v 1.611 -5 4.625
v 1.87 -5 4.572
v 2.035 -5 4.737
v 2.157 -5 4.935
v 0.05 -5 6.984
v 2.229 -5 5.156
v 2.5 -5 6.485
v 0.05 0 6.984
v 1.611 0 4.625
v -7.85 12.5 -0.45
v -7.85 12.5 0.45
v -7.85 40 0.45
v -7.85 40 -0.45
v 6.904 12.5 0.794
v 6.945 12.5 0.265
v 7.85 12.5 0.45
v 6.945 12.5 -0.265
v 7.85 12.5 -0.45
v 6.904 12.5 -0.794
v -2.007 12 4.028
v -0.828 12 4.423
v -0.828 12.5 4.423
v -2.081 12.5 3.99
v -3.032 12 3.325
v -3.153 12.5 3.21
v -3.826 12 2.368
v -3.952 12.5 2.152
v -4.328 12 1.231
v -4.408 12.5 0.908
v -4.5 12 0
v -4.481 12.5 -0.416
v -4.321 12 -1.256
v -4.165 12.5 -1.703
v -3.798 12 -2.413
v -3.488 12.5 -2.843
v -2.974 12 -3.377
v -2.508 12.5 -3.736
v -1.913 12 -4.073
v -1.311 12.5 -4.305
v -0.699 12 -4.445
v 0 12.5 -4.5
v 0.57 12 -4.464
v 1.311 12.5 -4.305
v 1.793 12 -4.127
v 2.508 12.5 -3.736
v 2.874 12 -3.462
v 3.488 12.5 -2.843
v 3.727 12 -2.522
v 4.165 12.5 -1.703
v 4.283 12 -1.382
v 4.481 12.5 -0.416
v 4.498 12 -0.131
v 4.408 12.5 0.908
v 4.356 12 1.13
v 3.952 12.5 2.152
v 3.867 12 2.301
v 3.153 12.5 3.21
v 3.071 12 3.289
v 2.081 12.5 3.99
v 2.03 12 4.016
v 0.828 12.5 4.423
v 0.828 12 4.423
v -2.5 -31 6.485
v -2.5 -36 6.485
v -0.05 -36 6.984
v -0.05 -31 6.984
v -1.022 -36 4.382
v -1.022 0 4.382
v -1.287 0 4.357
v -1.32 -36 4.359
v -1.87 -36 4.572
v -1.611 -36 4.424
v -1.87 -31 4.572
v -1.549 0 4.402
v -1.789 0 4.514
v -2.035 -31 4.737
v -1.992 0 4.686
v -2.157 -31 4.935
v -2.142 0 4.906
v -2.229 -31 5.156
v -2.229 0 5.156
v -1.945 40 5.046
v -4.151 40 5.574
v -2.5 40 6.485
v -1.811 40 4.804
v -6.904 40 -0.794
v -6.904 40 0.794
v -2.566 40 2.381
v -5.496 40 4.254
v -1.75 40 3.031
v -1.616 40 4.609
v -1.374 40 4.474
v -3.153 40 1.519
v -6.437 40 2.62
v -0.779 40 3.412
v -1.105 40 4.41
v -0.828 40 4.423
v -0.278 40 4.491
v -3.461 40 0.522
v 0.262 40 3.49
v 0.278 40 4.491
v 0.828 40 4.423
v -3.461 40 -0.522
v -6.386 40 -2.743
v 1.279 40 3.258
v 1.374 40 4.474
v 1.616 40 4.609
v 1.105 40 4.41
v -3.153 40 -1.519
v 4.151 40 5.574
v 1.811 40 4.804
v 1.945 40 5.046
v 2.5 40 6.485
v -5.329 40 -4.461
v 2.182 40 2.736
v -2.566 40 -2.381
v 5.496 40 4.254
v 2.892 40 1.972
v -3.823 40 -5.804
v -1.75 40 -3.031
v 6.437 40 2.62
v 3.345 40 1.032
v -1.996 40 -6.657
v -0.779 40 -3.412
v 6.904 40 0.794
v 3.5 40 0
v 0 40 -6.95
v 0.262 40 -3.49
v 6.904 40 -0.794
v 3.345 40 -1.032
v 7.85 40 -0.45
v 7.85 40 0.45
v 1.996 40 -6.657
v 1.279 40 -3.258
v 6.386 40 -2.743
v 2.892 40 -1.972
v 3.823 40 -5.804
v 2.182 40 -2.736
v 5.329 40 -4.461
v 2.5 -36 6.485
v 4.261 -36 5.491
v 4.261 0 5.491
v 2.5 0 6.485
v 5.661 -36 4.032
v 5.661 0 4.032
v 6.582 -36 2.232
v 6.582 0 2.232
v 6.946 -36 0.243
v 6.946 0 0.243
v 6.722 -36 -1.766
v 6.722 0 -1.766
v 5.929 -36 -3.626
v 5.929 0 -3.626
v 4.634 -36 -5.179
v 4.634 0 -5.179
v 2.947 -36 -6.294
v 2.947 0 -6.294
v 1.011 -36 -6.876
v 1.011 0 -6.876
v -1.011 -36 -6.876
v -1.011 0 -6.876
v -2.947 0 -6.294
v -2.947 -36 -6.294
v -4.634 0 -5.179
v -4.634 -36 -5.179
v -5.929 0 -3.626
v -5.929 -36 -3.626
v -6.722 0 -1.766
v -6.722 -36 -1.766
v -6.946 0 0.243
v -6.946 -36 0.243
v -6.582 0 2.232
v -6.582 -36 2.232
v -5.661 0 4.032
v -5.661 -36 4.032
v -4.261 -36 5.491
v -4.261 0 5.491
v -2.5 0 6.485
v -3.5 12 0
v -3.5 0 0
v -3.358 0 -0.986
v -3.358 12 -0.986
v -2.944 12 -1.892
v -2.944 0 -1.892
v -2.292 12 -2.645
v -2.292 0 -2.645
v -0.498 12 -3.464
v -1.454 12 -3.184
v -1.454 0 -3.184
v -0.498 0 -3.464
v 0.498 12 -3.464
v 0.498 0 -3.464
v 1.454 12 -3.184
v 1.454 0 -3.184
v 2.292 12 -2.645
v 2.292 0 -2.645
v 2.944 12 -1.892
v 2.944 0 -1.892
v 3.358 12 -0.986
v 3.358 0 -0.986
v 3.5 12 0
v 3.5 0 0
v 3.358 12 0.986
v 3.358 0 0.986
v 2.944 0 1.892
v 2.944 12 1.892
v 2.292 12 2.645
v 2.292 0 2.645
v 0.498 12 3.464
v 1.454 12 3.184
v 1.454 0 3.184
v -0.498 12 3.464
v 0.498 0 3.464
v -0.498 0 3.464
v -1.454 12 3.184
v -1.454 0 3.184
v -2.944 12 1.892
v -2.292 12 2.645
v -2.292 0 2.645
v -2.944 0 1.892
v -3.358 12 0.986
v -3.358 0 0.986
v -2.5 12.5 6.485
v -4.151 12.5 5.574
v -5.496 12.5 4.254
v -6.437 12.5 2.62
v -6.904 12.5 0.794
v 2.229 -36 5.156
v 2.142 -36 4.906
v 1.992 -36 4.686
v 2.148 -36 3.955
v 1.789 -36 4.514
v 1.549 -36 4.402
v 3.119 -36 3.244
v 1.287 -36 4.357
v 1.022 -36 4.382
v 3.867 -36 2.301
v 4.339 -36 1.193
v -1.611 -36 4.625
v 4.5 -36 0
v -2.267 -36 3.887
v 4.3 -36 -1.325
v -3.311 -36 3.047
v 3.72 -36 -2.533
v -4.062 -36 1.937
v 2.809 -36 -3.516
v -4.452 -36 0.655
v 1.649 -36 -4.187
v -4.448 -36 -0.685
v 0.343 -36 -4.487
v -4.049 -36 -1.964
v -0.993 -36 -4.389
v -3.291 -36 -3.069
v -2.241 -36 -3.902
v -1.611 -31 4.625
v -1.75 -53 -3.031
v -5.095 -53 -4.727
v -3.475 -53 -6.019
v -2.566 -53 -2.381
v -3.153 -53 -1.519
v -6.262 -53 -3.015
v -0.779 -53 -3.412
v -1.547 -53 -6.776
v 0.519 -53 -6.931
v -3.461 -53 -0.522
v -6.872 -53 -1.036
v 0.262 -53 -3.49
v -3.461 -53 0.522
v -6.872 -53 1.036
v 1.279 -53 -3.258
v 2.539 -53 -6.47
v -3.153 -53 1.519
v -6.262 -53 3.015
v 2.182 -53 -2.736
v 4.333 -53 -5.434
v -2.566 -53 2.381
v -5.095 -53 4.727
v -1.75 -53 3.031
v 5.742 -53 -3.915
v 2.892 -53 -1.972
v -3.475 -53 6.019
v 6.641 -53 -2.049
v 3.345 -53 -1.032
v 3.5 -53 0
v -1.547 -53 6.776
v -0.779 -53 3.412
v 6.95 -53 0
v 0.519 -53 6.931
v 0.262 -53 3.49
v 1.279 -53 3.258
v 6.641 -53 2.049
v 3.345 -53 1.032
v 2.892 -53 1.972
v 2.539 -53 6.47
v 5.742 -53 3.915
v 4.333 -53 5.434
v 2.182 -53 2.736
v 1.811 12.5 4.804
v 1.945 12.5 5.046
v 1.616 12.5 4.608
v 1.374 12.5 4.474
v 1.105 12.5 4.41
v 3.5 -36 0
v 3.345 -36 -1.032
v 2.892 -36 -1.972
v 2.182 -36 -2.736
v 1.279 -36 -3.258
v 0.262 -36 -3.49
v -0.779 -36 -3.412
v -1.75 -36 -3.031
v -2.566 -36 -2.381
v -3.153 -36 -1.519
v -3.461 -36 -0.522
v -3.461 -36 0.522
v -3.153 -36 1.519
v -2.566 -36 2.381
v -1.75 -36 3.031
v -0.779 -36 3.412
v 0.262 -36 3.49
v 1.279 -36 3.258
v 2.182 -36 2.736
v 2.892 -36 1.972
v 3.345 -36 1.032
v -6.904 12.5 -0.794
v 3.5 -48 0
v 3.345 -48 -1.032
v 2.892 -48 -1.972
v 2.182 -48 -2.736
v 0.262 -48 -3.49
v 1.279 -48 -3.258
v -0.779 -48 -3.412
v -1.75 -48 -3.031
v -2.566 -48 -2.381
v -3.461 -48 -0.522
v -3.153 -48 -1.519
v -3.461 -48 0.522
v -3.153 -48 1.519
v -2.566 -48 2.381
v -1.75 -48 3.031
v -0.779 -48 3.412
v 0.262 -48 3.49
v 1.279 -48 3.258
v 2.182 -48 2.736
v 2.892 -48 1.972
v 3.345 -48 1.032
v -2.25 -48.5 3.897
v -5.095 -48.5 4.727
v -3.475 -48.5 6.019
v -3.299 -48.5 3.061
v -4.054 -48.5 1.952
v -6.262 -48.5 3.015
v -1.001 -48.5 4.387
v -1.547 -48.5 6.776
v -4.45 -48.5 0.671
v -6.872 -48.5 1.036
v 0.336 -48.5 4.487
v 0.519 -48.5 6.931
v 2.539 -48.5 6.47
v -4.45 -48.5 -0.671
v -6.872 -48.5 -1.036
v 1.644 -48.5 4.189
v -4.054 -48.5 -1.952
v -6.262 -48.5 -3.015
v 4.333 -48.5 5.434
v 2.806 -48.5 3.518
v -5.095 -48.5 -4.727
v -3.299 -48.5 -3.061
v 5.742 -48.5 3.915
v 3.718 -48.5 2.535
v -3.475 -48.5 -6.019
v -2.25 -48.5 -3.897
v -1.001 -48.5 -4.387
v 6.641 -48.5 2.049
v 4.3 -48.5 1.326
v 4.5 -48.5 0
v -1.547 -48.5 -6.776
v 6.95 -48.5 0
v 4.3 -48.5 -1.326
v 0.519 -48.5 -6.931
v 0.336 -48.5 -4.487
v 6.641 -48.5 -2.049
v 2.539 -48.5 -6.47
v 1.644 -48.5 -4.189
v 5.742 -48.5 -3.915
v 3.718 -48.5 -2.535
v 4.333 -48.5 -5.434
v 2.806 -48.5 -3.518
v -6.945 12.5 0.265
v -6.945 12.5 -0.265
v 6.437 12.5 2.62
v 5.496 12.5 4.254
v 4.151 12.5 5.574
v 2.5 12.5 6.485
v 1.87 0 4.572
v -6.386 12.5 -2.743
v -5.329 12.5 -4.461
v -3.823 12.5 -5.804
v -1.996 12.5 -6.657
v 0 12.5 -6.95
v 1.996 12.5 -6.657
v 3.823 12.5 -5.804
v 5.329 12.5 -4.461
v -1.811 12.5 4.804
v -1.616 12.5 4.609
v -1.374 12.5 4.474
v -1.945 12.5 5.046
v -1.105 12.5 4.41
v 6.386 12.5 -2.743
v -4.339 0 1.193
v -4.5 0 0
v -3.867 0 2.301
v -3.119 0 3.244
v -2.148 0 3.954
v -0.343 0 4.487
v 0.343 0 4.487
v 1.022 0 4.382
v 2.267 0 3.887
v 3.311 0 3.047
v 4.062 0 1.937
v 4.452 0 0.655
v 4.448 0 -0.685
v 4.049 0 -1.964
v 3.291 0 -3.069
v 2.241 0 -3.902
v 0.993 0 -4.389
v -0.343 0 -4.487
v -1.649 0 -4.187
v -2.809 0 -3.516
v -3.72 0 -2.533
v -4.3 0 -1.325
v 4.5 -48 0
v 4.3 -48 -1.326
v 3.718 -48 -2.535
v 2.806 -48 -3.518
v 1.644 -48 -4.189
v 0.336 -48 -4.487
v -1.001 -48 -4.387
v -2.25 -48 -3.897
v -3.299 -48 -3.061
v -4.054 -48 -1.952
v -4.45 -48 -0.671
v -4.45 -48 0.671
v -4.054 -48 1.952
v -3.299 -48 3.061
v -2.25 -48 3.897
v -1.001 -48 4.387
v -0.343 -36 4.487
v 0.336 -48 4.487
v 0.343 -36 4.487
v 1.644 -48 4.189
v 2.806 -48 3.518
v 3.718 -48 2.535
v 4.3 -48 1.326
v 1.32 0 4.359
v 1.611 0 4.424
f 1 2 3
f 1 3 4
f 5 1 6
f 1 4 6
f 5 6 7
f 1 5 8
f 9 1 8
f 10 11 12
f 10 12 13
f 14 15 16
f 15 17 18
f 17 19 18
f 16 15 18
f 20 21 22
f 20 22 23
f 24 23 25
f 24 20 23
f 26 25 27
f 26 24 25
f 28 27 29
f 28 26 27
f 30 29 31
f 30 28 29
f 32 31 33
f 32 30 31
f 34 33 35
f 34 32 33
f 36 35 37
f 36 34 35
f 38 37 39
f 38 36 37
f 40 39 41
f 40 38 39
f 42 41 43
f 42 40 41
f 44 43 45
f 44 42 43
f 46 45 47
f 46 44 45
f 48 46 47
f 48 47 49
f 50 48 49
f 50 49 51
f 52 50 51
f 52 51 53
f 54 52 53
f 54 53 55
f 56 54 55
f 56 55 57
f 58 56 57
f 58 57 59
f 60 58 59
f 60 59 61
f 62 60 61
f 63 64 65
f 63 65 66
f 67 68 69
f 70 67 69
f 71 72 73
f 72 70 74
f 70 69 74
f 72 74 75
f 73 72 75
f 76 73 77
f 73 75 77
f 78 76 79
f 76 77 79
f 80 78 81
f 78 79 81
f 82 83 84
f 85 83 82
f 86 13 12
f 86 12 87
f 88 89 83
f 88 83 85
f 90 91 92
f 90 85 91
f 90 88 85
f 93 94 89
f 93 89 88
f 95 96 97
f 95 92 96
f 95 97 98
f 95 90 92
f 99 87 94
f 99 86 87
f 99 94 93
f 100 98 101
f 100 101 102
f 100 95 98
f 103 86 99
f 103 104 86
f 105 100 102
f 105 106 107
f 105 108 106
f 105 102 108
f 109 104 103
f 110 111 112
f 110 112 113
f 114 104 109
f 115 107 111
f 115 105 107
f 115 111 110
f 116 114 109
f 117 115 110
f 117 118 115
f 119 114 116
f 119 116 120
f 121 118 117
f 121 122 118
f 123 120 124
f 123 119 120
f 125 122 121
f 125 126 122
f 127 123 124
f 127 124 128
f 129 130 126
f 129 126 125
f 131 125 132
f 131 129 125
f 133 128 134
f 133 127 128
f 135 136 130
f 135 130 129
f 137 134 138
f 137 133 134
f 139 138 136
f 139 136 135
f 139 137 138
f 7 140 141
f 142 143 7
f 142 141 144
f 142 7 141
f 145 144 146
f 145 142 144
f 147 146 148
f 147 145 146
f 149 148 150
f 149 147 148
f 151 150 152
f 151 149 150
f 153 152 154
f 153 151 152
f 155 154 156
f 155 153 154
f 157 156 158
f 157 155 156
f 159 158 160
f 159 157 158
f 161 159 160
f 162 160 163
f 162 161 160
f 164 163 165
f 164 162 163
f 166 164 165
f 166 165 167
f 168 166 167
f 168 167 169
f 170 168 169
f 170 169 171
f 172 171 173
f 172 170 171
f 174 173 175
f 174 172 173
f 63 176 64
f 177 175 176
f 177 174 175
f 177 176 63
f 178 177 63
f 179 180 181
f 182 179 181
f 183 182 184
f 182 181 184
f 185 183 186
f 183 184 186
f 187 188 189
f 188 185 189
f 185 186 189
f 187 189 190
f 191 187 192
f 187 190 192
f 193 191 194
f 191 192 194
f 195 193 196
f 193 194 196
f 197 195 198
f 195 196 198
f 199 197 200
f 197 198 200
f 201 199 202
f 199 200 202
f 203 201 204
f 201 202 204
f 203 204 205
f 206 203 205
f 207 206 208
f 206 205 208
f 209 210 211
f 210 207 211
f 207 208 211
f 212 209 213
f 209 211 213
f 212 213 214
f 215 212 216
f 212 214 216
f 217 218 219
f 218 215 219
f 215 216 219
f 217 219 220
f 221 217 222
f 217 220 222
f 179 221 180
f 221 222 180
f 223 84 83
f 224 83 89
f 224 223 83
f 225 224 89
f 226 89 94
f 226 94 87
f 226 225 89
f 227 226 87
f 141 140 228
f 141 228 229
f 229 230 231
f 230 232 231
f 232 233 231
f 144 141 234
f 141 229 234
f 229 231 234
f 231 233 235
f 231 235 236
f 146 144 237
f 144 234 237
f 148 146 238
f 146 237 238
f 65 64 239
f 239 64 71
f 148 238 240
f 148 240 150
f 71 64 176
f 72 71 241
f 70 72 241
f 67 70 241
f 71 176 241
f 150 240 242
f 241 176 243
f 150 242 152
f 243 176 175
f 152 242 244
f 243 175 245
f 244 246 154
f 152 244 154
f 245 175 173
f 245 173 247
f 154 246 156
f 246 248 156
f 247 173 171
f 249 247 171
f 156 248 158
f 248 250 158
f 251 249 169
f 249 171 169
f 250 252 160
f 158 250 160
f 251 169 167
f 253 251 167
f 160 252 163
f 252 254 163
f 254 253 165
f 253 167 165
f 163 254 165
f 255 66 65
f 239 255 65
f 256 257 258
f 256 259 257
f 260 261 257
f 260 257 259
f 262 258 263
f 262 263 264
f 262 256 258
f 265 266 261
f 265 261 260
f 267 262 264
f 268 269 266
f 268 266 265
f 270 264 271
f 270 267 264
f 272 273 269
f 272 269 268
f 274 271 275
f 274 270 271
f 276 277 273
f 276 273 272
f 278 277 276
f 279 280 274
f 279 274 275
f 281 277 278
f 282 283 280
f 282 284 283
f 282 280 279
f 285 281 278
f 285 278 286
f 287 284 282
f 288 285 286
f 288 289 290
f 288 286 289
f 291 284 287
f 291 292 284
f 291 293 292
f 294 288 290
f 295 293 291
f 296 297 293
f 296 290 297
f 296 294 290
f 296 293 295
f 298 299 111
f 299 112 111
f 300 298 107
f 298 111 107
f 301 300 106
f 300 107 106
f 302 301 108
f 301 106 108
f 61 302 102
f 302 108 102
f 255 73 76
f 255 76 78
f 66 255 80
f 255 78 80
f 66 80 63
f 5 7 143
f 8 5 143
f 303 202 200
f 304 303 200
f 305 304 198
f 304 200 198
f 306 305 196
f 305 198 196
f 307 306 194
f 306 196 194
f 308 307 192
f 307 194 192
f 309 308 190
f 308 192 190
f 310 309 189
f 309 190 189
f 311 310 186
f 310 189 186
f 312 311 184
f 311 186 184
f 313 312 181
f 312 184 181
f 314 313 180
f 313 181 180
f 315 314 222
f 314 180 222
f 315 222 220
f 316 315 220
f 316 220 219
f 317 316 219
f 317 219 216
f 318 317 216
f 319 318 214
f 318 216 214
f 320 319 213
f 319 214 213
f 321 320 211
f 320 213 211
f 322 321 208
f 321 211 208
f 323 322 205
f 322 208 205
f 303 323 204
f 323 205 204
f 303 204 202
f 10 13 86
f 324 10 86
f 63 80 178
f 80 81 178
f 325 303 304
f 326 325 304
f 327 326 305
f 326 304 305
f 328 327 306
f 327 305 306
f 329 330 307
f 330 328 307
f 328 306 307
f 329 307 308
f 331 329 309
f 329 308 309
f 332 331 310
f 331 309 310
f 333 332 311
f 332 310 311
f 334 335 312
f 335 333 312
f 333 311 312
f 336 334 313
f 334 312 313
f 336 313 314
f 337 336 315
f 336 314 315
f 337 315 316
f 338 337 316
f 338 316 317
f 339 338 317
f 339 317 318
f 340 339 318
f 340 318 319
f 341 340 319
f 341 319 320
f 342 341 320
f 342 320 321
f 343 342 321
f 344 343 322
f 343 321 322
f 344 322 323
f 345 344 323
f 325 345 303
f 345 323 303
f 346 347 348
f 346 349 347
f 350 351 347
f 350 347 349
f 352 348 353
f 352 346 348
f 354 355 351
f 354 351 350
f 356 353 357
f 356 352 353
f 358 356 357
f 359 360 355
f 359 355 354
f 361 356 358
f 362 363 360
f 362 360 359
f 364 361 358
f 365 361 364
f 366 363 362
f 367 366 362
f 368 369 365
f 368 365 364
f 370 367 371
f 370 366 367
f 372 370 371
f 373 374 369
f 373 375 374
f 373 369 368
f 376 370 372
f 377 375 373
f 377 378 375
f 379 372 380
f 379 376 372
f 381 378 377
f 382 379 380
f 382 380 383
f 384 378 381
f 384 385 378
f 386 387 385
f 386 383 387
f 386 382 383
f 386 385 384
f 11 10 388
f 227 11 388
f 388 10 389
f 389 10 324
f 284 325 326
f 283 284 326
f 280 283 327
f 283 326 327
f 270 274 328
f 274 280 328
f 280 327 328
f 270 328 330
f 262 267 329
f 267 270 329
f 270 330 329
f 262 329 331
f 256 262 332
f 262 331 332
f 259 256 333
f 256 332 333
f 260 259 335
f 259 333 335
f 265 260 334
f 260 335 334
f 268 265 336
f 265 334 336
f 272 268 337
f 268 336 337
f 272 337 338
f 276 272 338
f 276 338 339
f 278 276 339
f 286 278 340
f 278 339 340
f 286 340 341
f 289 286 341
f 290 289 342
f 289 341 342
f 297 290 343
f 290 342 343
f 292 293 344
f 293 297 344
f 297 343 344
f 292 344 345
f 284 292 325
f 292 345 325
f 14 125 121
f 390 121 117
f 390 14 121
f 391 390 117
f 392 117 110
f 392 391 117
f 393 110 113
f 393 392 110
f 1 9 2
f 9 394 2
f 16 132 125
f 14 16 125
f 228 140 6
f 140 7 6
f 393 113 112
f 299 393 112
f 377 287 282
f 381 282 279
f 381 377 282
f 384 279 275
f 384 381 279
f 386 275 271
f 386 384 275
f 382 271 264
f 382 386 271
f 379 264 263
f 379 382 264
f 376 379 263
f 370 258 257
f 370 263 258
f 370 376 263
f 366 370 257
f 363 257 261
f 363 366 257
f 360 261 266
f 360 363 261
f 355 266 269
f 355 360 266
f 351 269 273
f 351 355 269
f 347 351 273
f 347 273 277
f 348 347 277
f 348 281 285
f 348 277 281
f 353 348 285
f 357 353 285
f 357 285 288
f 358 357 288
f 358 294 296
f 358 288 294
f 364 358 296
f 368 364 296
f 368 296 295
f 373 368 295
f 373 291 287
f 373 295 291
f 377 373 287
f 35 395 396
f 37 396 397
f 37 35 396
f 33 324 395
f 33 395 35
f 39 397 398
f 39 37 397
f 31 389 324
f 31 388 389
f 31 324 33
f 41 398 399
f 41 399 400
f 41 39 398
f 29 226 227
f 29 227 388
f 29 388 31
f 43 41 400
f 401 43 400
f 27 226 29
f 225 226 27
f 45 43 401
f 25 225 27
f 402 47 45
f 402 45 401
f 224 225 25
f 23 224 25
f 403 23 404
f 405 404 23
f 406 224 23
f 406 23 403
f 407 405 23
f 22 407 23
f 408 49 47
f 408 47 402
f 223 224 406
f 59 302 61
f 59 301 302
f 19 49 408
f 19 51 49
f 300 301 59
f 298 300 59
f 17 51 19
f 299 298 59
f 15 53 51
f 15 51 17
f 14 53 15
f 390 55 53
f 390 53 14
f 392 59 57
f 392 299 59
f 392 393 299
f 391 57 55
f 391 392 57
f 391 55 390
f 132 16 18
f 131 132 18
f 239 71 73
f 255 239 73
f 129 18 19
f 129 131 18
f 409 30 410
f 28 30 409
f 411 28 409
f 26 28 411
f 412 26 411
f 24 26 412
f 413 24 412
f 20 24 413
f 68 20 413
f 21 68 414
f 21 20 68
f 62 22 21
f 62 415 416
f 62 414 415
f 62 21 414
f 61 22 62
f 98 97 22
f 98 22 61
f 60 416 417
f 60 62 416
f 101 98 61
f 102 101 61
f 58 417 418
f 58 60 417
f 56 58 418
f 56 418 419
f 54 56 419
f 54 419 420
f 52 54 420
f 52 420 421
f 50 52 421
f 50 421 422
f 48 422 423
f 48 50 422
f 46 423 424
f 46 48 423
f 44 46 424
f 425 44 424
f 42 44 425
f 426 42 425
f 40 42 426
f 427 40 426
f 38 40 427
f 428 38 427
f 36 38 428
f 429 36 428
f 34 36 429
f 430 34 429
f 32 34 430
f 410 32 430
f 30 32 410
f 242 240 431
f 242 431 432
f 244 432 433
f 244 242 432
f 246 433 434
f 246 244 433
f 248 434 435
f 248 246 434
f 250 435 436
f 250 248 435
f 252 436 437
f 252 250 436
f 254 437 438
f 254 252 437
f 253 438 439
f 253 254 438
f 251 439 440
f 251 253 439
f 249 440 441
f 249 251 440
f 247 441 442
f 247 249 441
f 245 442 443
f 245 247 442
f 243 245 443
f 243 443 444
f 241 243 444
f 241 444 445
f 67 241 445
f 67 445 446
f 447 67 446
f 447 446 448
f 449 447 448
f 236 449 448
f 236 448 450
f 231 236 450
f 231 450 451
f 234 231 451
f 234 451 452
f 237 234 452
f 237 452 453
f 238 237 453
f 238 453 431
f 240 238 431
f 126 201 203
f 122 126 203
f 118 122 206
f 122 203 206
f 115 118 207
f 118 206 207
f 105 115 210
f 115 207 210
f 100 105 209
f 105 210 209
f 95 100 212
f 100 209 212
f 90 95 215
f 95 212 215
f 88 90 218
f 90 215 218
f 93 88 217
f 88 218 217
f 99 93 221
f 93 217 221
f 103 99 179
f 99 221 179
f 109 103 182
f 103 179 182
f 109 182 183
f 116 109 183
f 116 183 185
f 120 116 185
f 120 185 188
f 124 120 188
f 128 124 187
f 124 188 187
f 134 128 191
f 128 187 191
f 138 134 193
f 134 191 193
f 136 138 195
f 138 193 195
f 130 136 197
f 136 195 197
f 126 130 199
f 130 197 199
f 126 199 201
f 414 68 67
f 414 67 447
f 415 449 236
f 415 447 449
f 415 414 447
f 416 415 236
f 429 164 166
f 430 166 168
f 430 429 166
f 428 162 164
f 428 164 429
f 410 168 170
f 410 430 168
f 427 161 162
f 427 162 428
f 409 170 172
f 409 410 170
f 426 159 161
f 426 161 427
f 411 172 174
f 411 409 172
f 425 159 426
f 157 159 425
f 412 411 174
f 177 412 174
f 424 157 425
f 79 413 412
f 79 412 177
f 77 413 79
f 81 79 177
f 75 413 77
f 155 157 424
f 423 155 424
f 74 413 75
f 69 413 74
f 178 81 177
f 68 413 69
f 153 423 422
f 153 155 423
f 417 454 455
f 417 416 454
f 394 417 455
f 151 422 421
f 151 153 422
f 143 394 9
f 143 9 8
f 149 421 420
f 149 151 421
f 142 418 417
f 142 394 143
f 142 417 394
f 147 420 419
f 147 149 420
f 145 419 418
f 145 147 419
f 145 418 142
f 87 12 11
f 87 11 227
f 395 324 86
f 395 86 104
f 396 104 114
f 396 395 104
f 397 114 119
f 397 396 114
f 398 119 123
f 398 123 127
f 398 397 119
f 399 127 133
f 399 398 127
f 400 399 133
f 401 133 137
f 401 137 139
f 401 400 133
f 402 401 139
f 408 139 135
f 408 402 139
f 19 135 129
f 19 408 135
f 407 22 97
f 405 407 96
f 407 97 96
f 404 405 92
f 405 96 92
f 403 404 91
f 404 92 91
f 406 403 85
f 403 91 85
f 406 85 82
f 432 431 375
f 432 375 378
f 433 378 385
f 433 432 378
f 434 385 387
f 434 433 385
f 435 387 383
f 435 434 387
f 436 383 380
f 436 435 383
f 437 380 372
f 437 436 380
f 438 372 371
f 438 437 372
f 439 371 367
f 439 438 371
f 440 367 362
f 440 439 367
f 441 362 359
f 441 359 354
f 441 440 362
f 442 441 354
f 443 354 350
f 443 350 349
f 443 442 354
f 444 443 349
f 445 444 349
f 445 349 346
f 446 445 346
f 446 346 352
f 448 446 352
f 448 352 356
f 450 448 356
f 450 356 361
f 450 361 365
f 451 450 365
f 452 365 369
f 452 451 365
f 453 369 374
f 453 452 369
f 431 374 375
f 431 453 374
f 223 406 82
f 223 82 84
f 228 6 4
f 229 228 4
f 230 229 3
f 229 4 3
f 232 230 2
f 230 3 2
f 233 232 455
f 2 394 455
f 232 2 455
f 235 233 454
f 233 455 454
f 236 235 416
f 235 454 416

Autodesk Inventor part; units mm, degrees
sketch "Sketch1" plane through (0, 0, 0) normal (0, 1, 0) x (-1, 0, 0)
  circle A0 centre (0, 0) radius 3.5
  circle A1 centre (0, 0) radius 4.5
  dimension "OD" = 9
  dimension "ID" = 7
extrude "Extrusion1" add sketch "Sketch1" along normal blind 12
ref_plane "Work Plane1" through (0, 0, -10) normal (-1, 0, 0) x (0, 0, 1)
sketch "Sketch2" plane through (0, 0, -10) normal (-1, 0, 0) x (0, 0, 1)
  circle A0 centre (14.67, 11.4) radius 0.6
  line L0 (5.5, 0) -> (14.5, 0) projected
  line L1 (14.5, 0) -> (14.5, 12) projected
  point P0 (10, 0)
  point P1 (14.5, 11.9754)
  dimension "d10" = 1.2
  dimension "d12" = 0.17
  dimension "d119" = 0.6
sketch "Sketch3" plane through (0, 0, 0) normal (0, -1, 0) x (1, 0, 0)
  circle A0 centre (0, 0) radius 3.5
  circle A1 centre (0, 0) radius 6.95
  dimension "d21" = 7
  dimension "OOD" = 13.9
extrude "Extrusion2" add sketch "Sketch3" along normal blind 36
sketch "Sketch4" plane through (0, -36, 0) normal (0, -1, 0) x (1, 0, 0)
  circle A0 centre (0, 0) radius 3.5
  circle A1 centre (0, 0) radius 4.5
  dimension "d25" = 7
  dimension "d26" = 9
extrude "Extrusion3" add sketch "Sketch4" along normal blind 12
sketch "Sketch5" plane through (0, 0, -10) normal (-1, 0, 0) x (0, 0, 1)
  circle A0 centre (14.67, -36.6) radius 0.6
  line L0 (14.5, -36) -> (14.5, -48) projected
  line L1 (3.05, -36) -> (16.95, -36) projected
  point P0 (10, 0)
  point P1 (14.5, -37.1754)
  point P2 (14.5, -36.0246)
  dimension "d29" = 1.2
  dimension "d30" = 0.17
  dimension "d31" = 0.6
sketch "Sketch6" plane through (0, 0, 0) normal (0, 1, 0) x (1, 0, 0)
  arc A0 (-2, -4.0311) -> (2, -4.0311) centre (0, 0) ccw
  arc A1 (-2.5, -6.4848) -> (2.5, -6.4848) centre (0, 0) ccw
  circle A2 centre (0, 0) radius 6.95 projected
  line L0 (2.5, -6.4848) -> (2, -4.0311)
  circle A3 centre (0, 0) radius 4.5 projected
  line L1 (-2, -4.0311) -> (-2.5, -6.4848)
  line L2 (0, -9.73) -> (0, 9.73) projected
  dimension "d42" = 5
  dimension "d43" = 4
  dimension "d45" = 2
  dimension "d46" = 2.5
extrude "Extrusion4" cut sketch "Sketch6" against normal blind 121.2 contours A0 L2 A1 L1 | A0 L0 A1 L2
fillet "Fillet1" radius 1 2 edges at (2, -18, 4.0311) (-2, -18, 4.0311)
ref_plane "Work Plane5" through (-10, 45, 0) normal (0, -1, 0) x (1, 0, 0)
ref_plane "Work Plane4" through (-10, 0, 0) normal (0, -1, 0) x (1, 0, 0)
sketch "Sketch13" plane through (0, 12, 0) normal (0, 1, 0) x (1, 0, 0)
  circle A0 centre (0, 0) radius 3.5
  circle A1 centre (0, 0) radius 6.95
  dimension "d75" = 13.9
  dimension "d105" = 7
extrude "Extrusion9" add sketch "Sketch13" along normal blind 28
sketch "Sketch17" plane through (2.5, -36, 6.4848) normal (-0.9798625, 0, 0.1996736) x (0.1996736, 0, 0.9798625)
  line L0 (-1.3556, 36) -> (0, 36) projected
  line L1 (0, 36) -> (-2, 36)
  line L2 (-2, 36) -> (-2, 31)
  line L3 (-2, 31) -> (0, 31)
  line L4 (0, 31) -> (0, 36)
  point P0 (-6.8534, 36)
  point P1 (-6.5156, 60)
  dimension "d94" = 2
  dimension "d95" = 5
extrude "Extrusion13" add sketch "Sketch17" along normal blind 2.5
sketch "Sketch18" plane through (-2.5, -36, 6.4848) normal (0.9798625, 0, 0.1996736) x (0.1996736, 0, -0.9798625)
  line L0 (0, 0) -> (0, 36) projected
  line L1 (0, 0) -> (2, 0)
  line L2 (2, 0) -> (2, 5)
  line L3 (2, 5) -> (0, 5)
  line L4 (0, 5) -> (0, 0)
  point P0 (6.8534, 36)
  dimension "d98" = 2
  dimension "d99" = 5
extrude "Extrusion14" add sketch "Sketch18" along normal blind 2.5
sketch "Sketch20" plane through (0, 40, 0) normal (0, 1, 0) x (1, 0, 0)
  circle A0 centre (0, 0) radius 3.5 construction
  circle A1 centre (0, 0) radius 6.95 construction
  arc A2 (2.5, -6.4848) -> (-2.5, -6.4848) centre (0, 0) ccw projected
  circle A3 centre (0, 0) radius 4.5
  arc A4 (-2.5, -6.4848) -> (2.5, -6.4848) centre (0, 0) ccw
  arc A5 (2.5, -6.4848) -> (-2.5, -6.4848) centre (0, 0) ccw projected
  line L0 (2.5, -6.4848) -> (0, 0)
  line L1 (0, 0) -> (-2.5, -6.4848)
  point P0 (0, -4.5)
  point P1 (1.6187, -4.1988)
  point P2 (-1.6187, -4.1988)
extrude "Extrusion16" cut sketch "Sketch20" against normal up to surface (28 mm away) contours A4 L1 A3 L0
fillet "Fillet3" radius 1 2 edges at (1.6187, 26, 4.1988) (-1.6187, 26, 4.1988)
sketch "Sketch21" plane through (0, -48, 0) normal (0, -1, 0) x (1, 0, 0)
  circle A0 centre (0, 0) radius 3.5 projected
  circle A1 centre (0, 0) radius 6.95
  dimension "d109" = 13.9
extrude "Extrusion17" add sketch "Sketch21" along normal blind 5
sketch "Sketch22" plane through (0, -48, 0) normal (0, 1, 0) x (1, 0, 0)
  circle A0 centre (0, 0) radius 6.95 projected
  circle A1 centre (0, 0) radius 4.5 projected
extrude "Extrusion18" cut sketch "Sketch22" against normal blind 0.5
sketch "Sketch23" plane through (0, 12, 0) normal (0, -1, 0) x (1, 0, 0)
  arc A0 (-0.8283, 4.4231) -> (0.8283, 4.4231) centre (0, 0) ccw projected
  arc A1 (-1.9454, 5.0463) -> (-0.8283, 4.4231) centre (-1.0124, 5.406) ccw projected
  line L0 (-1.9454, 5.0463) -> (-2.5, 6.4848) projected
  arc A2 (-2.5, 6.4848) -> (2.5, 6.4848) centre (0, 0) ccw projected
  line L1 (2.5, 6.4848) -> (1.9454, 5.0463) projected
  arc A3 (0.8283, 4.4231) -> (1.9454, 5.0463) centre (1.0124, 5.406) ccw projected
extrude "Extrusion19" cut sketch "Sketch23" against normal blind 0.5
chamfer "Chamfer1" distance 2 angle 45 2 edges at (-0.349, -2.5, 5.0242) (0.349, -33.5, 5.0242)
ref_plane "Work Plane6" through (0, -18, 0) normal (0, 1, 0) x (1, 0, 0)
sketch "Sketch24" plane through (0, 40, 0) normal (0, 1, 0) x (1, 0, 0)
  line L0 (7.85, -0.45) -> (7.85, 0.45)
  line L1 (7.85, 0.45) -> (6.9045, 0.7941)
  arc A0 (2.5, -6.4848) -> (-2.5, -6.4848) centre (0, 0) ccw projected
  line L2 (7.85, -0.45) -> (6.9045, -0.7941)
  line L3 (-7.85, -0.45) -> (-7.85, 0.45)
  line L4 (-7.85, 0.45) -> (-6.9045, 0.7941)
  arc A1 (2.5, -6.4848) -> (-2.5, -6.4848) centre (0, 0) ccw projected
  line L5 (-7.85, -0.45) -> (-6.9045, -0.7941)
  dimension "d121" = 0.9
  dimension "d123" = 0.9
  dimension "d125" = 110
  dimension "d126" = 110
  dimension "d128" = 0.9
  dimension "d129" = 0.9
  dimension "d130" = 110
  dimension "d131" = 110
extrude "Extrusion20" add sketch "Sketch24" against normal up to surface (27.5 mm away)
equation "\"d21\" = ID"
equation "\"d25\" = ID"
equation "\"d26\" = OD"
equation "\"d75\" = OOD"
equation "\"d105\" = ID"
equation "\"d109\" = OOD"
properties part number "2101_Rx Coil Body_V1"
